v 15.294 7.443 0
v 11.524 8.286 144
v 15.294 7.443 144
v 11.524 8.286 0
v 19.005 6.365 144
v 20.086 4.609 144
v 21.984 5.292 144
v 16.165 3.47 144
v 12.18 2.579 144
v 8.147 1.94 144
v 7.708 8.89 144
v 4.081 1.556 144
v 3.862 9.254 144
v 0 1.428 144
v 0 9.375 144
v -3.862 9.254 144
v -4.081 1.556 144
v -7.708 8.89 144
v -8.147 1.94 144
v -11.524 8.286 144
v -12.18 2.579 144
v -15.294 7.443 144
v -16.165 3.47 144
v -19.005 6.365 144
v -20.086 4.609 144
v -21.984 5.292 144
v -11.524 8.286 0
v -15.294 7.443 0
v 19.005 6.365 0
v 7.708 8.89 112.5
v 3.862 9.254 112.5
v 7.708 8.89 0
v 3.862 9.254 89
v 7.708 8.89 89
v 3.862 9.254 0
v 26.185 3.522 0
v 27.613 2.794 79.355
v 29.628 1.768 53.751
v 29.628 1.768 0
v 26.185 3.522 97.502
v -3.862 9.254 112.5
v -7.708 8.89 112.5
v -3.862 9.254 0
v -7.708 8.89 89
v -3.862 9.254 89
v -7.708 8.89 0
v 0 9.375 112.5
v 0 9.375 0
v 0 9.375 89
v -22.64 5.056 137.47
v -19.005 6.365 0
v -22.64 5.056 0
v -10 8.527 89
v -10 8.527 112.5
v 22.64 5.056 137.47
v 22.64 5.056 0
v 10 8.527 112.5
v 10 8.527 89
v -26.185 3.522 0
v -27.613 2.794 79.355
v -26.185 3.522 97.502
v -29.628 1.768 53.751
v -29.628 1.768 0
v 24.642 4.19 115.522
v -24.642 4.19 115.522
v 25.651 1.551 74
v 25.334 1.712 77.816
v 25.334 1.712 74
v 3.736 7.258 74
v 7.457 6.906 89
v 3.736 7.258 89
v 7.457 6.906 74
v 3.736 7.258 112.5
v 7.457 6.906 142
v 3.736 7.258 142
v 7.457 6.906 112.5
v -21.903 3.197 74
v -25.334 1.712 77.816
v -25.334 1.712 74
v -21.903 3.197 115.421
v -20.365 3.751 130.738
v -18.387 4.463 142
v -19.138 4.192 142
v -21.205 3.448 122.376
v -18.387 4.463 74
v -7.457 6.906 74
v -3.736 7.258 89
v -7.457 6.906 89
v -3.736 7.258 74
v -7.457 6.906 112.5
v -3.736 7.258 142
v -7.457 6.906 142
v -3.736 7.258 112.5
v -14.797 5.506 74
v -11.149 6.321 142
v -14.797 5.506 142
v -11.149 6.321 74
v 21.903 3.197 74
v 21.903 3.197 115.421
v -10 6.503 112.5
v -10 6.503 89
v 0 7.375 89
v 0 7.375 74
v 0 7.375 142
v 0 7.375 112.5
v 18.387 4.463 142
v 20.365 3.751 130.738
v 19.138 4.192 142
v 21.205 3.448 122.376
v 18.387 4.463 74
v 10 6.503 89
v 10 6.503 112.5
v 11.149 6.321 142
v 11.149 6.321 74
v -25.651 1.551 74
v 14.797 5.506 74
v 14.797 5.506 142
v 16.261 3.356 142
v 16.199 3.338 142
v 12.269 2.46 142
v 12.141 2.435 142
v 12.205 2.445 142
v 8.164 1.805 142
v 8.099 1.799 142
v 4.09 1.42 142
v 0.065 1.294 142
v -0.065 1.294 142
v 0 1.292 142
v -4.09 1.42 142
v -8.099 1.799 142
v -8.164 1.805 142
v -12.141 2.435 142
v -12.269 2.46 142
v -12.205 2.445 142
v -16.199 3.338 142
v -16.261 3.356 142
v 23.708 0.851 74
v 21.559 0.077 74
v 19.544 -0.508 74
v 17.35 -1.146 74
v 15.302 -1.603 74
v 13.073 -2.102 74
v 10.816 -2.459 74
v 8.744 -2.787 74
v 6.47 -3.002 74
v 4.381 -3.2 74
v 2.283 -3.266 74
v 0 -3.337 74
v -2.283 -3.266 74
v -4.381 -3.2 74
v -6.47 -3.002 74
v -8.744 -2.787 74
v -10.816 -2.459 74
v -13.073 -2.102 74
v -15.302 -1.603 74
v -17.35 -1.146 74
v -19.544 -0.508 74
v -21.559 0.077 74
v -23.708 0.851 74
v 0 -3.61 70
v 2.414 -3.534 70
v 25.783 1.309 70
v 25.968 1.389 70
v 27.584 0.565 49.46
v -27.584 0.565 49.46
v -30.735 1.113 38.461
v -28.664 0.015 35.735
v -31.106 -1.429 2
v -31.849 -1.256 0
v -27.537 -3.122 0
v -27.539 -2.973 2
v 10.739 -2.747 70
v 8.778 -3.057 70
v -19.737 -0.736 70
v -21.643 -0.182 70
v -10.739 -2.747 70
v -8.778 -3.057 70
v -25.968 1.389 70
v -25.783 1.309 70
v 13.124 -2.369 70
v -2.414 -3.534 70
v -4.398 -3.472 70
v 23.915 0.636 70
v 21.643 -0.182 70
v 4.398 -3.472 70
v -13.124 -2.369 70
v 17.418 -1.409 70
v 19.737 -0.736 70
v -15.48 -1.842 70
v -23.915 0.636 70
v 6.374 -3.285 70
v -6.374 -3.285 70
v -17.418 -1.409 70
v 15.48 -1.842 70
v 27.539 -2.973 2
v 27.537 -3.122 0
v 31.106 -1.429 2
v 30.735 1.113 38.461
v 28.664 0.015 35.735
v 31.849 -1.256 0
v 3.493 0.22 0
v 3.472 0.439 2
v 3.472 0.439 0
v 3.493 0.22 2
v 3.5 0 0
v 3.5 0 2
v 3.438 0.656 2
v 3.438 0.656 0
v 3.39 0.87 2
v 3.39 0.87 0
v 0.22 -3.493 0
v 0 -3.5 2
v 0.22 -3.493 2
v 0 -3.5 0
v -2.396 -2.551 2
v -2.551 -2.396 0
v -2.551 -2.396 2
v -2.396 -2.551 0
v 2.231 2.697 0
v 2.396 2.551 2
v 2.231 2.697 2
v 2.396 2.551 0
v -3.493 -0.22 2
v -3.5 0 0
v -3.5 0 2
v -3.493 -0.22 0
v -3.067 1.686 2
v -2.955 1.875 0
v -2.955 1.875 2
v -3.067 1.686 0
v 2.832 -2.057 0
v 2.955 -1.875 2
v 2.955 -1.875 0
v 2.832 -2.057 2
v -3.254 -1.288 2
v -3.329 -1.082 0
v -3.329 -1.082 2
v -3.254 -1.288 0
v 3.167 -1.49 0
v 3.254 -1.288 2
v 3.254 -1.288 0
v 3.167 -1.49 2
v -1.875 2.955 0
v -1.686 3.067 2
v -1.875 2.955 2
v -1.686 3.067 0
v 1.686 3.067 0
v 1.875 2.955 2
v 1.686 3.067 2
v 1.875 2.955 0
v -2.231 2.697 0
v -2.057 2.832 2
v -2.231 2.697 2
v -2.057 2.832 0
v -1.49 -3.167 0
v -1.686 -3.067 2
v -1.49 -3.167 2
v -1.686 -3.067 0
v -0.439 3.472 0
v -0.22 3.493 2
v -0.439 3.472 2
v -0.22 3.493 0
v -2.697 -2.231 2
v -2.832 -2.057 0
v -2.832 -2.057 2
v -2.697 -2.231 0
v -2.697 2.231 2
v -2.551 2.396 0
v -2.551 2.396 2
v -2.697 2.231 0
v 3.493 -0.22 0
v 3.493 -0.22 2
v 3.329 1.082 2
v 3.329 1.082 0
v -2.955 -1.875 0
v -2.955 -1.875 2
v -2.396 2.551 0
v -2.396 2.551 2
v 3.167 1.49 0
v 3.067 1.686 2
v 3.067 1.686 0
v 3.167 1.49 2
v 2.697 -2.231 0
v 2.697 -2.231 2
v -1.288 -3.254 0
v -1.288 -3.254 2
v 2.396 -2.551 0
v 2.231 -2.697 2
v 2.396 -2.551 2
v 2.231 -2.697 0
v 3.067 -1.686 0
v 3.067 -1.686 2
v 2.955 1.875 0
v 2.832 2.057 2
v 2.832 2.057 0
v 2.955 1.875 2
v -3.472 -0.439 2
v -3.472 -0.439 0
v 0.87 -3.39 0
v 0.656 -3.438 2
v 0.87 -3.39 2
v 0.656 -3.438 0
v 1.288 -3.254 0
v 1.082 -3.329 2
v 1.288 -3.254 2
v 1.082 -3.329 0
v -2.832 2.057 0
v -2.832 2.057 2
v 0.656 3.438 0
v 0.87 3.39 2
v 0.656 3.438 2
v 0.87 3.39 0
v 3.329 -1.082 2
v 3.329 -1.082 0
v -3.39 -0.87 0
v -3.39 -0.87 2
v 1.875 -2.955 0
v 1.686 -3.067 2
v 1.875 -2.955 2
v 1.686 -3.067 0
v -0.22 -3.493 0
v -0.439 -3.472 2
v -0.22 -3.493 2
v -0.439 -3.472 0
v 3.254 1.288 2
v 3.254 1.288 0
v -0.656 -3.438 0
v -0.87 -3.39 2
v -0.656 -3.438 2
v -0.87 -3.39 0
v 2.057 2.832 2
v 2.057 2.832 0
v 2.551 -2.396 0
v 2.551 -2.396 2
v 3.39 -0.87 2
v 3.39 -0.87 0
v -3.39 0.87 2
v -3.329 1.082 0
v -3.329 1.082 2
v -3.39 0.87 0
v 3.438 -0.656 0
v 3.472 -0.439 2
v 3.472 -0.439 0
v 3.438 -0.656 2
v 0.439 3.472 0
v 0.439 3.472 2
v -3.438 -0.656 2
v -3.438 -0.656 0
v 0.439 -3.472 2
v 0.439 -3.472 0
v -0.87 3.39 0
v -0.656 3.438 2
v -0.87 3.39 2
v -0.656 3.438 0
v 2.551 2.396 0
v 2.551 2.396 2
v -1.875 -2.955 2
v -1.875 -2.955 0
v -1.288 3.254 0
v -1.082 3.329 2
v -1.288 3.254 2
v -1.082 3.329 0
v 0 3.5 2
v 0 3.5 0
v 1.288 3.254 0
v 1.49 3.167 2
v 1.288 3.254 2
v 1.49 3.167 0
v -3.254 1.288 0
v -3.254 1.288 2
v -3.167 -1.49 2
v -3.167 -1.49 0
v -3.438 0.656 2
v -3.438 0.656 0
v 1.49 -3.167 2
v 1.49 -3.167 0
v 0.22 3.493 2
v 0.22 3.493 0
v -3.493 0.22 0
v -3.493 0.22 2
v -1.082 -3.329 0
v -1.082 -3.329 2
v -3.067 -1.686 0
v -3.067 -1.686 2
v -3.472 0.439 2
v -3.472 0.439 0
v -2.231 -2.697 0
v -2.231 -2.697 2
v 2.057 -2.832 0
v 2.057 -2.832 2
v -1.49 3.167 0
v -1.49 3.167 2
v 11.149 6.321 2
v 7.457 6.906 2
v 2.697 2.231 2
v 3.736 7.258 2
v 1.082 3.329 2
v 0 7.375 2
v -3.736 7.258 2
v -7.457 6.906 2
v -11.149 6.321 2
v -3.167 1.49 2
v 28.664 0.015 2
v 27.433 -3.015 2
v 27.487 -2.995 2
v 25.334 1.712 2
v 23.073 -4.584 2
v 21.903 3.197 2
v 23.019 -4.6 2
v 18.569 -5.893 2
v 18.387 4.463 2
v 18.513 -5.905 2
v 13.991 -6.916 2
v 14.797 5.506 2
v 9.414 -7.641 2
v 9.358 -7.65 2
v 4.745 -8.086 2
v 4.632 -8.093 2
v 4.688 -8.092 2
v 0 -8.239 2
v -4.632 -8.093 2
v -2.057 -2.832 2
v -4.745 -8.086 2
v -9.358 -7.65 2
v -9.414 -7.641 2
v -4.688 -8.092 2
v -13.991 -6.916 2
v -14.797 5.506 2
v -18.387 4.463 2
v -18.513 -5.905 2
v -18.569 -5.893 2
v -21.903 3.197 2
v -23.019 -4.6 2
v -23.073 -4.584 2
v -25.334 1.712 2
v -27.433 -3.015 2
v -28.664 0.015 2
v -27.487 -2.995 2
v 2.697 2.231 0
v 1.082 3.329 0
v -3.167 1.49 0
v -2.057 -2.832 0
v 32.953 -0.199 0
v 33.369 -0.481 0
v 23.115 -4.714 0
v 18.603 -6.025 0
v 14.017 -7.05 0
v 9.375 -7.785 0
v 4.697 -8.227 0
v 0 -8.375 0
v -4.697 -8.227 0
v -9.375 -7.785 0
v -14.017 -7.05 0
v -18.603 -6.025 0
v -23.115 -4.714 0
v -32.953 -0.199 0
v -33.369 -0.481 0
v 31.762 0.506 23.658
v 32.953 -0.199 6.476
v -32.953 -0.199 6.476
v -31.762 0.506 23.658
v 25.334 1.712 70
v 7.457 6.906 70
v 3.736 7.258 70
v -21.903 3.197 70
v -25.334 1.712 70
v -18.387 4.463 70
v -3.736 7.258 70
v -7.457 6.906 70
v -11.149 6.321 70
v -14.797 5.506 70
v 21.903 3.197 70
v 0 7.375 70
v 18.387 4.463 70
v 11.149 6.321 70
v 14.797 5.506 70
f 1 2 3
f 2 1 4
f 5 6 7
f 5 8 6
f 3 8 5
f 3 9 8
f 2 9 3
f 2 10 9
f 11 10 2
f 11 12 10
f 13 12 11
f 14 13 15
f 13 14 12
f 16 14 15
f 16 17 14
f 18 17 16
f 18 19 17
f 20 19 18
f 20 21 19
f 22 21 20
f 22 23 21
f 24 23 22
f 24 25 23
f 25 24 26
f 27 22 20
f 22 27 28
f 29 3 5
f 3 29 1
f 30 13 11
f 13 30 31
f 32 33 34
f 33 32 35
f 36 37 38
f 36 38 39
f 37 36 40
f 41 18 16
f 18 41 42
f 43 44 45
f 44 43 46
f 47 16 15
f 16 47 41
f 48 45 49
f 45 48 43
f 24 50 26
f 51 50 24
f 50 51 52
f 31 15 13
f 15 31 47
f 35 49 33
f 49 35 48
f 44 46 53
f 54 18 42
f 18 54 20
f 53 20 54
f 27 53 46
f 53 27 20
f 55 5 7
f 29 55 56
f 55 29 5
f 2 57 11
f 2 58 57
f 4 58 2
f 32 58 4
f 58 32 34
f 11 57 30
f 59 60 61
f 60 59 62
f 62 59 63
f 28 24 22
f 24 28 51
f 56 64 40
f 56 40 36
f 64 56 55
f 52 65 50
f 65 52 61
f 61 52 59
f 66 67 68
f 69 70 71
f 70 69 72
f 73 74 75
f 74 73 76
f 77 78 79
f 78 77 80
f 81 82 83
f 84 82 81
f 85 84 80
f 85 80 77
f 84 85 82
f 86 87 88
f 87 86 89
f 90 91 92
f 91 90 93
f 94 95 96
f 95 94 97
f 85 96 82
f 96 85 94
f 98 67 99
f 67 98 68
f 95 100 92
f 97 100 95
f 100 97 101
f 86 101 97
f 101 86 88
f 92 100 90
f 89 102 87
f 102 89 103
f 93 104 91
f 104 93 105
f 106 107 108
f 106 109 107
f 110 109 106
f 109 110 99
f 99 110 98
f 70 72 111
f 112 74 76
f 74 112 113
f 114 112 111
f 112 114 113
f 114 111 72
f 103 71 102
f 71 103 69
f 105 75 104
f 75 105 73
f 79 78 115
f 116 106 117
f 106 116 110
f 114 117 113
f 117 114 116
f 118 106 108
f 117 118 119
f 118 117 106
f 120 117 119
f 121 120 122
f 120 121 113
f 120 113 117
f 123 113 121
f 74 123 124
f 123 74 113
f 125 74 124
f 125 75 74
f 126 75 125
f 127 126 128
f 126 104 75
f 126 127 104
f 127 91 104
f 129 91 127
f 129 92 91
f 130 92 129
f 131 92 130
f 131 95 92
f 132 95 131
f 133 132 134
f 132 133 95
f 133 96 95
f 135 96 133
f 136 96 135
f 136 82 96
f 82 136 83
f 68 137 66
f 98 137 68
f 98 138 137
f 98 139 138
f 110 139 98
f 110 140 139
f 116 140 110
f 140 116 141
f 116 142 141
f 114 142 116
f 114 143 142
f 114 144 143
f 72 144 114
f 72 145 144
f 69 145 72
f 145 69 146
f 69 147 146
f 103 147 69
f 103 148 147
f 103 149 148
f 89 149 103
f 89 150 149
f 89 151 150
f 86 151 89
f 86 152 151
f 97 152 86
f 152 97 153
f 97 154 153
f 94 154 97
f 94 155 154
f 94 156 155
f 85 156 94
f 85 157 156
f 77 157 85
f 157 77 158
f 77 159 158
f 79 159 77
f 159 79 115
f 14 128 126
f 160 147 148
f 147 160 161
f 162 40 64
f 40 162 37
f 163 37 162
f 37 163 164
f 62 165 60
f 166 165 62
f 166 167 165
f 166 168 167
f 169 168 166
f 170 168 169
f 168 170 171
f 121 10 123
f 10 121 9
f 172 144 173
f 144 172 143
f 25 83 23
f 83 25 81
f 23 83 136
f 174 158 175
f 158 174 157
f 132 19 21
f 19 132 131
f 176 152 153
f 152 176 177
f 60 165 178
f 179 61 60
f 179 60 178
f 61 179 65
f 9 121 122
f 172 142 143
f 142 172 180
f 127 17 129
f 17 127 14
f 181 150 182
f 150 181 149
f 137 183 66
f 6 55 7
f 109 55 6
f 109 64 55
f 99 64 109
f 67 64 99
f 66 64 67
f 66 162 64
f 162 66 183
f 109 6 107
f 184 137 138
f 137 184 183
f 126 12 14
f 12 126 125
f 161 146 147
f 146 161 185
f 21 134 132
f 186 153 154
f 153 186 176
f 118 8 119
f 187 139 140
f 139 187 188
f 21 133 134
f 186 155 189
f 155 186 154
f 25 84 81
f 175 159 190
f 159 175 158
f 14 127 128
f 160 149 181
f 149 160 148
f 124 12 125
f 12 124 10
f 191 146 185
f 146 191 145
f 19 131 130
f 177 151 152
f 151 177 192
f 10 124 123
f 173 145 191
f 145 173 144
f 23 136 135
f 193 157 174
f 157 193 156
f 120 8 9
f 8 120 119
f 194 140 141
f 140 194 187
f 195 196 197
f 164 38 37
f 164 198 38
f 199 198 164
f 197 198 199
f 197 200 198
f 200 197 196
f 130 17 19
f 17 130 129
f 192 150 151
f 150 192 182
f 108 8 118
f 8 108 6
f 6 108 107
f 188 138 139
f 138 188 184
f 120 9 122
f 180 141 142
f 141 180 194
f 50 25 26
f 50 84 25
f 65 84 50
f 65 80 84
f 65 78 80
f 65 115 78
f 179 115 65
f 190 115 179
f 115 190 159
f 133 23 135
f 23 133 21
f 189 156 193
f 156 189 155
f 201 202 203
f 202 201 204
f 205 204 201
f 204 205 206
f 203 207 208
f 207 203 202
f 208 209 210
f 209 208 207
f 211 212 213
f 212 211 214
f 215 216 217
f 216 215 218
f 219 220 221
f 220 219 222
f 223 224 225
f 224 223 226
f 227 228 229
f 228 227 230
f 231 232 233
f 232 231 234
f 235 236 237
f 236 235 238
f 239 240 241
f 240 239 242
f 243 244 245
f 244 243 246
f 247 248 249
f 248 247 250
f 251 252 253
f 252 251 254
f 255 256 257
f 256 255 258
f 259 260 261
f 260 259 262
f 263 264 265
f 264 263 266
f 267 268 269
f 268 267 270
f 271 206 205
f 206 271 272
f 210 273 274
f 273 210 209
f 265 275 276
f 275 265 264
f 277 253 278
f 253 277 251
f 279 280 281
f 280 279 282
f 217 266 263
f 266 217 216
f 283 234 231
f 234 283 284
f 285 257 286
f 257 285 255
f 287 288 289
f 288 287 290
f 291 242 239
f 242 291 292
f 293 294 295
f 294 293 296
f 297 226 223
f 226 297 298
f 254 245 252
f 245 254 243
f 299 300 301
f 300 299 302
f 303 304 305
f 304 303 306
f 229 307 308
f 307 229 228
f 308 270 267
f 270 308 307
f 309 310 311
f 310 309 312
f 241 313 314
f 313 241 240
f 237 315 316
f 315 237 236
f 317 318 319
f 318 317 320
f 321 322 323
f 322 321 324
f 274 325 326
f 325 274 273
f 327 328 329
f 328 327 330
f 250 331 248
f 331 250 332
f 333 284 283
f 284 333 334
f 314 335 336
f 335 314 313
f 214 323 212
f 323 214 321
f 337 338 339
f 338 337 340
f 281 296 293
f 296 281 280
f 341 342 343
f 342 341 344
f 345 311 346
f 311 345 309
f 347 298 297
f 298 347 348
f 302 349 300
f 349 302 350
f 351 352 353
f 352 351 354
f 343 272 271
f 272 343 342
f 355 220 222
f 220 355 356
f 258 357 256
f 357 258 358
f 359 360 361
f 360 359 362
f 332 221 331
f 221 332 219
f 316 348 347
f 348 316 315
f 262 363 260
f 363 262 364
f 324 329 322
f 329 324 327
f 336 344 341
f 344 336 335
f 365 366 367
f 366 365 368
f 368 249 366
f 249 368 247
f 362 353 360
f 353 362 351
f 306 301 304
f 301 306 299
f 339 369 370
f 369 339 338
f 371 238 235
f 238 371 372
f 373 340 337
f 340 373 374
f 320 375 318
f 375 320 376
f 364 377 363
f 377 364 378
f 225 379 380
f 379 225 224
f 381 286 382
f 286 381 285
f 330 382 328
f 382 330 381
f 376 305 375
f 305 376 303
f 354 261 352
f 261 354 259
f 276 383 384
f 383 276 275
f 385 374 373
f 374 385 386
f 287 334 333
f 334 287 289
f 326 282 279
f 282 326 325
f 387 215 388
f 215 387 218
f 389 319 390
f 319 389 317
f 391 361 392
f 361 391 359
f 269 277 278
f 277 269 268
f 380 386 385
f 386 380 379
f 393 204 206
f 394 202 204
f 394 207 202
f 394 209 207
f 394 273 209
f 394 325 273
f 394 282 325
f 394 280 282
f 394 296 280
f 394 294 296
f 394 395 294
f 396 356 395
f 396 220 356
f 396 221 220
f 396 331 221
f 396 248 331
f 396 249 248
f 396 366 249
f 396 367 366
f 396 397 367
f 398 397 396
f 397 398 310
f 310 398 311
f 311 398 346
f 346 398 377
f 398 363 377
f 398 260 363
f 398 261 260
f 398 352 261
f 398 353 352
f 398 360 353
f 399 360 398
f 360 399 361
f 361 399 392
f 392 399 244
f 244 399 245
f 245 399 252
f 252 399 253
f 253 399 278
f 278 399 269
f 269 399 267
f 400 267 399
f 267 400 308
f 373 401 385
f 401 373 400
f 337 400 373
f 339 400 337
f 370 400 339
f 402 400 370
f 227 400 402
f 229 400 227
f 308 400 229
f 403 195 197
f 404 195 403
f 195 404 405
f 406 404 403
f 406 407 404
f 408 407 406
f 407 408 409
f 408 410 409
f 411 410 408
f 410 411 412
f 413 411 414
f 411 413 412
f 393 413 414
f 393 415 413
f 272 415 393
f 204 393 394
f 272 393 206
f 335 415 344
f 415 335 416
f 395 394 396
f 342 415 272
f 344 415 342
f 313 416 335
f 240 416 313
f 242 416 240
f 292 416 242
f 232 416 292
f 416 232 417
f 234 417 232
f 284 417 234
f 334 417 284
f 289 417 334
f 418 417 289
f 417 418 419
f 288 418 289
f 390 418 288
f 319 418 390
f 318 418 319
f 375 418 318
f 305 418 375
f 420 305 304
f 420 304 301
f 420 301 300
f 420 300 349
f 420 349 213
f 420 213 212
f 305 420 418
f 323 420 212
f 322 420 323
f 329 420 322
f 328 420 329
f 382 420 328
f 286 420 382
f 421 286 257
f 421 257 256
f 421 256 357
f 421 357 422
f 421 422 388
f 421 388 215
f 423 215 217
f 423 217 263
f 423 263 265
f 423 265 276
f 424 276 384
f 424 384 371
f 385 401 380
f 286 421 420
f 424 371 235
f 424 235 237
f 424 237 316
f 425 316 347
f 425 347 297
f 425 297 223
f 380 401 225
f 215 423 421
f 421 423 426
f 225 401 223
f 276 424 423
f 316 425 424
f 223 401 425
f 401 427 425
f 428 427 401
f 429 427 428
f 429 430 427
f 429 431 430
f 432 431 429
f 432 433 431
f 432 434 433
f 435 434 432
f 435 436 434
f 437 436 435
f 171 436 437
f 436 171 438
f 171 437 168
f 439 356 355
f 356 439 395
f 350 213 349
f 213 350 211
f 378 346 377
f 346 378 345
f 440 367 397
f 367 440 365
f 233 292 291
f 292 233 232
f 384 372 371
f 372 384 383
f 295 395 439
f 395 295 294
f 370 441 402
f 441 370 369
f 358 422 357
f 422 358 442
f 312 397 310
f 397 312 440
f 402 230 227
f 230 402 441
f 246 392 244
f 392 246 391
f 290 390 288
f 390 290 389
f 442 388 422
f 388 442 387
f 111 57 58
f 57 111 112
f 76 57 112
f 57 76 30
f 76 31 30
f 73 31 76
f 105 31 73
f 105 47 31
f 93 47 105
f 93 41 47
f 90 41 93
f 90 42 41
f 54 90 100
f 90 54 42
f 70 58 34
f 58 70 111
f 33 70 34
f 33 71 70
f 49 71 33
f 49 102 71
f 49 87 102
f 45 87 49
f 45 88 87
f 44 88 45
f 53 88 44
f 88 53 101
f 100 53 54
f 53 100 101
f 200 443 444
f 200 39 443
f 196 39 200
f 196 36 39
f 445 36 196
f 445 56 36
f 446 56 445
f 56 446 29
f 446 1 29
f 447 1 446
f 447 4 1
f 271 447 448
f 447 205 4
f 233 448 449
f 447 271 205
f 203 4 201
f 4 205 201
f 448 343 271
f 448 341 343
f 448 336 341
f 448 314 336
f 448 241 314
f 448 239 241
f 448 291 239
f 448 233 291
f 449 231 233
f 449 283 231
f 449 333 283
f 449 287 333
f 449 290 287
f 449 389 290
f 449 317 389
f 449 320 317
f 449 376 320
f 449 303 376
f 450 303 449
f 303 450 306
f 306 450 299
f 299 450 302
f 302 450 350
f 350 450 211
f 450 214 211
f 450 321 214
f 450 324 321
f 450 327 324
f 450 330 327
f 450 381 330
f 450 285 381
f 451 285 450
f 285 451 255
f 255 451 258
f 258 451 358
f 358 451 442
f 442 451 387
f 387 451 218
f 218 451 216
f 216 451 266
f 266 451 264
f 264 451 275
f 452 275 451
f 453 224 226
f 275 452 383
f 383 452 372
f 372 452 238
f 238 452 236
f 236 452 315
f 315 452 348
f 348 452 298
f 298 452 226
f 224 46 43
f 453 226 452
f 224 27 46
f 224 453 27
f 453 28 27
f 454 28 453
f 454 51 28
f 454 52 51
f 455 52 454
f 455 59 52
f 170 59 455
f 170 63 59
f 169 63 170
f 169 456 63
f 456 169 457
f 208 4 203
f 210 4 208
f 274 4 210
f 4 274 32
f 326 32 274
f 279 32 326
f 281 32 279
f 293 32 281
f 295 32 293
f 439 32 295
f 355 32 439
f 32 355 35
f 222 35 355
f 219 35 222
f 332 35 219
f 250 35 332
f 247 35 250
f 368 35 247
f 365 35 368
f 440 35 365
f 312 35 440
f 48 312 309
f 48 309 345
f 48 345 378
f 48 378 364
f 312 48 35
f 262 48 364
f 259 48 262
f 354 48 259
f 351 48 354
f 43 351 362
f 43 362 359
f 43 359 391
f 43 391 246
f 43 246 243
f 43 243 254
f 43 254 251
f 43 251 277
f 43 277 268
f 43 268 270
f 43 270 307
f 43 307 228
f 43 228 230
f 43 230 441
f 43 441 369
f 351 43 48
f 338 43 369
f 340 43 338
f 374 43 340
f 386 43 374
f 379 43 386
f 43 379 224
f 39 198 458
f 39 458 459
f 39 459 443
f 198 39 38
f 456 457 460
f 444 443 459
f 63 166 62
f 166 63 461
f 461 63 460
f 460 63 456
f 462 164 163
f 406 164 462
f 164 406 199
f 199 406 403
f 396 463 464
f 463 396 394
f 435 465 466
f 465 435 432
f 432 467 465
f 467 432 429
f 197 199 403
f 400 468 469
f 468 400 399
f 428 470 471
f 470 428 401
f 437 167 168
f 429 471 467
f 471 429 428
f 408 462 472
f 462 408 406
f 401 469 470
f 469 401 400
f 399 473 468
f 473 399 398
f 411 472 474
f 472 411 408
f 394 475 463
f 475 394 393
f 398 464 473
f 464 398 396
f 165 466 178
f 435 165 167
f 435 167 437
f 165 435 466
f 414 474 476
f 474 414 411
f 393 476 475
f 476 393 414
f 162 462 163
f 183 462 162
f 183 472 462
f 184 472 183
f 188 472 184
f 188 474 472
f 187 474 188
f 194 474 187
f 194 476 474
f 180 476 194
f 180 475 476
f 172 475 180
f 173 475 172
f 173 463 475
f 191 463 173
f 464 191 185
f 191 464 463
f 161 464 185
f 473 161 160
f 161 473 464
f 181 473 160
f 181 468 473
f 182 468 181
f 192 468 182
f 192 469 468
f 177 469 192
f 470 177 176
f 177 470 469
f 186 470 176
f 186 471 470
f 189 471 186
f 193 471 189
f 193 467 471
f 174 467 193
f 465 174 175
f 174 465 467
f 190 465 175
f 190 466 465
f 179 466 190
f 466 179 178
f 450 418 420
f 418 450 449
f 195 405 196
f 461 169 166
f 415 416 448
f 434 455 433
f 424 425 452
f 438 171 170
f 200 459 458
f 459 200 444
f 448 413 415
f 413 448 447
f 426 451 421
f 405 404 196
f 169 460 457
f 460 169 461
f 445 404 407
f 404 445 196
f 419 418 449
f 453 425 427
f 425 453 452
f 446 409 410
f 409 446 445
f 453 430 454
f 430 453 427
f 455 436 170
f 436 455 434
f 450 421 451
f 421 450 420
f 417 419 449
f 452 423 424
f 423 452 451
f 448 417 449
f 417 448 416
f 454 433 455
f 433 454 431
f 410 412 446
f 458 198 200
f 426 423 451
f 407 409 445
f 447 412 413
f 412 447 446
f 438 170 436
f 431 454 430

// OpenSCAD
// cone_top_diameter is more sensitive
// due to lower resolution (diameter instead of circumference)
// try increasing it slightly first...
cone_top_diameter = 130;
cone_bottom_circumference = 470;
cone_bottom_inset = 16.75;

height = 144;
cylinder_diameter = 123;

cone_bottom_radius = cone_bottom_circumference / (2 * PI);
cone_top_radius = cone_top_diameter / 2;
cylinder_radius = cylinder_diameter / 2;

module grinder(){
    cylinder(r1=cone_bottom_radius, r2=cone_top_radius , h=height, $fn=100);
}

// I'm using the receptacle to intersect with, so I changed it's height
// to half the plate's height, and gave it a top and bottom to form the ledges.
module receptacle(){
    difference(){
        cylinder(r=cylinder_radius, h=height/2, $fn=100);
        translate([0, 0, 2])
            cylinder(r=cylinder_radius-2, h=height/2-4, $fn=100);
    }
}

module plate_top(){
    difference(){
        translate([0, -cone_bottom_inset/2, 0])
        intersection(){
            translate([0, cone_bottom_radius, 0])
                grinder();
            translate([0, -cylinder_radius+1 + cone_bottom_inset, 0])
                receptacle();
        }
        union(){
            // round hole
            cylinder(r=3.5, h=4, center=true, $fn=100);
            // chute hole
            translate([0, 0, 89+11.75])
                cube([20, 100, 23.5], center=true);
        }
    }
}

module plate_bottom(){
    difference(){
        translate([0, -cone_bottom_inset/2, 0])
        intersection(){
            translate([0, cone_bottom_radius, 0])
                grinder();
            translate([0, -cylinder_radius+1 + cone_bottom_inset, height/2])
                receptacle();
        }
        union(){
            // round hole
            cylinder(r=3.5, h=4, center=true, $fn=100);
            // chute hole
            translate([0, 0, 89+11.75])
                cube([20, 100, 23.5], center=true);
        }
    }
}

plate_bottom();
plate_top();
